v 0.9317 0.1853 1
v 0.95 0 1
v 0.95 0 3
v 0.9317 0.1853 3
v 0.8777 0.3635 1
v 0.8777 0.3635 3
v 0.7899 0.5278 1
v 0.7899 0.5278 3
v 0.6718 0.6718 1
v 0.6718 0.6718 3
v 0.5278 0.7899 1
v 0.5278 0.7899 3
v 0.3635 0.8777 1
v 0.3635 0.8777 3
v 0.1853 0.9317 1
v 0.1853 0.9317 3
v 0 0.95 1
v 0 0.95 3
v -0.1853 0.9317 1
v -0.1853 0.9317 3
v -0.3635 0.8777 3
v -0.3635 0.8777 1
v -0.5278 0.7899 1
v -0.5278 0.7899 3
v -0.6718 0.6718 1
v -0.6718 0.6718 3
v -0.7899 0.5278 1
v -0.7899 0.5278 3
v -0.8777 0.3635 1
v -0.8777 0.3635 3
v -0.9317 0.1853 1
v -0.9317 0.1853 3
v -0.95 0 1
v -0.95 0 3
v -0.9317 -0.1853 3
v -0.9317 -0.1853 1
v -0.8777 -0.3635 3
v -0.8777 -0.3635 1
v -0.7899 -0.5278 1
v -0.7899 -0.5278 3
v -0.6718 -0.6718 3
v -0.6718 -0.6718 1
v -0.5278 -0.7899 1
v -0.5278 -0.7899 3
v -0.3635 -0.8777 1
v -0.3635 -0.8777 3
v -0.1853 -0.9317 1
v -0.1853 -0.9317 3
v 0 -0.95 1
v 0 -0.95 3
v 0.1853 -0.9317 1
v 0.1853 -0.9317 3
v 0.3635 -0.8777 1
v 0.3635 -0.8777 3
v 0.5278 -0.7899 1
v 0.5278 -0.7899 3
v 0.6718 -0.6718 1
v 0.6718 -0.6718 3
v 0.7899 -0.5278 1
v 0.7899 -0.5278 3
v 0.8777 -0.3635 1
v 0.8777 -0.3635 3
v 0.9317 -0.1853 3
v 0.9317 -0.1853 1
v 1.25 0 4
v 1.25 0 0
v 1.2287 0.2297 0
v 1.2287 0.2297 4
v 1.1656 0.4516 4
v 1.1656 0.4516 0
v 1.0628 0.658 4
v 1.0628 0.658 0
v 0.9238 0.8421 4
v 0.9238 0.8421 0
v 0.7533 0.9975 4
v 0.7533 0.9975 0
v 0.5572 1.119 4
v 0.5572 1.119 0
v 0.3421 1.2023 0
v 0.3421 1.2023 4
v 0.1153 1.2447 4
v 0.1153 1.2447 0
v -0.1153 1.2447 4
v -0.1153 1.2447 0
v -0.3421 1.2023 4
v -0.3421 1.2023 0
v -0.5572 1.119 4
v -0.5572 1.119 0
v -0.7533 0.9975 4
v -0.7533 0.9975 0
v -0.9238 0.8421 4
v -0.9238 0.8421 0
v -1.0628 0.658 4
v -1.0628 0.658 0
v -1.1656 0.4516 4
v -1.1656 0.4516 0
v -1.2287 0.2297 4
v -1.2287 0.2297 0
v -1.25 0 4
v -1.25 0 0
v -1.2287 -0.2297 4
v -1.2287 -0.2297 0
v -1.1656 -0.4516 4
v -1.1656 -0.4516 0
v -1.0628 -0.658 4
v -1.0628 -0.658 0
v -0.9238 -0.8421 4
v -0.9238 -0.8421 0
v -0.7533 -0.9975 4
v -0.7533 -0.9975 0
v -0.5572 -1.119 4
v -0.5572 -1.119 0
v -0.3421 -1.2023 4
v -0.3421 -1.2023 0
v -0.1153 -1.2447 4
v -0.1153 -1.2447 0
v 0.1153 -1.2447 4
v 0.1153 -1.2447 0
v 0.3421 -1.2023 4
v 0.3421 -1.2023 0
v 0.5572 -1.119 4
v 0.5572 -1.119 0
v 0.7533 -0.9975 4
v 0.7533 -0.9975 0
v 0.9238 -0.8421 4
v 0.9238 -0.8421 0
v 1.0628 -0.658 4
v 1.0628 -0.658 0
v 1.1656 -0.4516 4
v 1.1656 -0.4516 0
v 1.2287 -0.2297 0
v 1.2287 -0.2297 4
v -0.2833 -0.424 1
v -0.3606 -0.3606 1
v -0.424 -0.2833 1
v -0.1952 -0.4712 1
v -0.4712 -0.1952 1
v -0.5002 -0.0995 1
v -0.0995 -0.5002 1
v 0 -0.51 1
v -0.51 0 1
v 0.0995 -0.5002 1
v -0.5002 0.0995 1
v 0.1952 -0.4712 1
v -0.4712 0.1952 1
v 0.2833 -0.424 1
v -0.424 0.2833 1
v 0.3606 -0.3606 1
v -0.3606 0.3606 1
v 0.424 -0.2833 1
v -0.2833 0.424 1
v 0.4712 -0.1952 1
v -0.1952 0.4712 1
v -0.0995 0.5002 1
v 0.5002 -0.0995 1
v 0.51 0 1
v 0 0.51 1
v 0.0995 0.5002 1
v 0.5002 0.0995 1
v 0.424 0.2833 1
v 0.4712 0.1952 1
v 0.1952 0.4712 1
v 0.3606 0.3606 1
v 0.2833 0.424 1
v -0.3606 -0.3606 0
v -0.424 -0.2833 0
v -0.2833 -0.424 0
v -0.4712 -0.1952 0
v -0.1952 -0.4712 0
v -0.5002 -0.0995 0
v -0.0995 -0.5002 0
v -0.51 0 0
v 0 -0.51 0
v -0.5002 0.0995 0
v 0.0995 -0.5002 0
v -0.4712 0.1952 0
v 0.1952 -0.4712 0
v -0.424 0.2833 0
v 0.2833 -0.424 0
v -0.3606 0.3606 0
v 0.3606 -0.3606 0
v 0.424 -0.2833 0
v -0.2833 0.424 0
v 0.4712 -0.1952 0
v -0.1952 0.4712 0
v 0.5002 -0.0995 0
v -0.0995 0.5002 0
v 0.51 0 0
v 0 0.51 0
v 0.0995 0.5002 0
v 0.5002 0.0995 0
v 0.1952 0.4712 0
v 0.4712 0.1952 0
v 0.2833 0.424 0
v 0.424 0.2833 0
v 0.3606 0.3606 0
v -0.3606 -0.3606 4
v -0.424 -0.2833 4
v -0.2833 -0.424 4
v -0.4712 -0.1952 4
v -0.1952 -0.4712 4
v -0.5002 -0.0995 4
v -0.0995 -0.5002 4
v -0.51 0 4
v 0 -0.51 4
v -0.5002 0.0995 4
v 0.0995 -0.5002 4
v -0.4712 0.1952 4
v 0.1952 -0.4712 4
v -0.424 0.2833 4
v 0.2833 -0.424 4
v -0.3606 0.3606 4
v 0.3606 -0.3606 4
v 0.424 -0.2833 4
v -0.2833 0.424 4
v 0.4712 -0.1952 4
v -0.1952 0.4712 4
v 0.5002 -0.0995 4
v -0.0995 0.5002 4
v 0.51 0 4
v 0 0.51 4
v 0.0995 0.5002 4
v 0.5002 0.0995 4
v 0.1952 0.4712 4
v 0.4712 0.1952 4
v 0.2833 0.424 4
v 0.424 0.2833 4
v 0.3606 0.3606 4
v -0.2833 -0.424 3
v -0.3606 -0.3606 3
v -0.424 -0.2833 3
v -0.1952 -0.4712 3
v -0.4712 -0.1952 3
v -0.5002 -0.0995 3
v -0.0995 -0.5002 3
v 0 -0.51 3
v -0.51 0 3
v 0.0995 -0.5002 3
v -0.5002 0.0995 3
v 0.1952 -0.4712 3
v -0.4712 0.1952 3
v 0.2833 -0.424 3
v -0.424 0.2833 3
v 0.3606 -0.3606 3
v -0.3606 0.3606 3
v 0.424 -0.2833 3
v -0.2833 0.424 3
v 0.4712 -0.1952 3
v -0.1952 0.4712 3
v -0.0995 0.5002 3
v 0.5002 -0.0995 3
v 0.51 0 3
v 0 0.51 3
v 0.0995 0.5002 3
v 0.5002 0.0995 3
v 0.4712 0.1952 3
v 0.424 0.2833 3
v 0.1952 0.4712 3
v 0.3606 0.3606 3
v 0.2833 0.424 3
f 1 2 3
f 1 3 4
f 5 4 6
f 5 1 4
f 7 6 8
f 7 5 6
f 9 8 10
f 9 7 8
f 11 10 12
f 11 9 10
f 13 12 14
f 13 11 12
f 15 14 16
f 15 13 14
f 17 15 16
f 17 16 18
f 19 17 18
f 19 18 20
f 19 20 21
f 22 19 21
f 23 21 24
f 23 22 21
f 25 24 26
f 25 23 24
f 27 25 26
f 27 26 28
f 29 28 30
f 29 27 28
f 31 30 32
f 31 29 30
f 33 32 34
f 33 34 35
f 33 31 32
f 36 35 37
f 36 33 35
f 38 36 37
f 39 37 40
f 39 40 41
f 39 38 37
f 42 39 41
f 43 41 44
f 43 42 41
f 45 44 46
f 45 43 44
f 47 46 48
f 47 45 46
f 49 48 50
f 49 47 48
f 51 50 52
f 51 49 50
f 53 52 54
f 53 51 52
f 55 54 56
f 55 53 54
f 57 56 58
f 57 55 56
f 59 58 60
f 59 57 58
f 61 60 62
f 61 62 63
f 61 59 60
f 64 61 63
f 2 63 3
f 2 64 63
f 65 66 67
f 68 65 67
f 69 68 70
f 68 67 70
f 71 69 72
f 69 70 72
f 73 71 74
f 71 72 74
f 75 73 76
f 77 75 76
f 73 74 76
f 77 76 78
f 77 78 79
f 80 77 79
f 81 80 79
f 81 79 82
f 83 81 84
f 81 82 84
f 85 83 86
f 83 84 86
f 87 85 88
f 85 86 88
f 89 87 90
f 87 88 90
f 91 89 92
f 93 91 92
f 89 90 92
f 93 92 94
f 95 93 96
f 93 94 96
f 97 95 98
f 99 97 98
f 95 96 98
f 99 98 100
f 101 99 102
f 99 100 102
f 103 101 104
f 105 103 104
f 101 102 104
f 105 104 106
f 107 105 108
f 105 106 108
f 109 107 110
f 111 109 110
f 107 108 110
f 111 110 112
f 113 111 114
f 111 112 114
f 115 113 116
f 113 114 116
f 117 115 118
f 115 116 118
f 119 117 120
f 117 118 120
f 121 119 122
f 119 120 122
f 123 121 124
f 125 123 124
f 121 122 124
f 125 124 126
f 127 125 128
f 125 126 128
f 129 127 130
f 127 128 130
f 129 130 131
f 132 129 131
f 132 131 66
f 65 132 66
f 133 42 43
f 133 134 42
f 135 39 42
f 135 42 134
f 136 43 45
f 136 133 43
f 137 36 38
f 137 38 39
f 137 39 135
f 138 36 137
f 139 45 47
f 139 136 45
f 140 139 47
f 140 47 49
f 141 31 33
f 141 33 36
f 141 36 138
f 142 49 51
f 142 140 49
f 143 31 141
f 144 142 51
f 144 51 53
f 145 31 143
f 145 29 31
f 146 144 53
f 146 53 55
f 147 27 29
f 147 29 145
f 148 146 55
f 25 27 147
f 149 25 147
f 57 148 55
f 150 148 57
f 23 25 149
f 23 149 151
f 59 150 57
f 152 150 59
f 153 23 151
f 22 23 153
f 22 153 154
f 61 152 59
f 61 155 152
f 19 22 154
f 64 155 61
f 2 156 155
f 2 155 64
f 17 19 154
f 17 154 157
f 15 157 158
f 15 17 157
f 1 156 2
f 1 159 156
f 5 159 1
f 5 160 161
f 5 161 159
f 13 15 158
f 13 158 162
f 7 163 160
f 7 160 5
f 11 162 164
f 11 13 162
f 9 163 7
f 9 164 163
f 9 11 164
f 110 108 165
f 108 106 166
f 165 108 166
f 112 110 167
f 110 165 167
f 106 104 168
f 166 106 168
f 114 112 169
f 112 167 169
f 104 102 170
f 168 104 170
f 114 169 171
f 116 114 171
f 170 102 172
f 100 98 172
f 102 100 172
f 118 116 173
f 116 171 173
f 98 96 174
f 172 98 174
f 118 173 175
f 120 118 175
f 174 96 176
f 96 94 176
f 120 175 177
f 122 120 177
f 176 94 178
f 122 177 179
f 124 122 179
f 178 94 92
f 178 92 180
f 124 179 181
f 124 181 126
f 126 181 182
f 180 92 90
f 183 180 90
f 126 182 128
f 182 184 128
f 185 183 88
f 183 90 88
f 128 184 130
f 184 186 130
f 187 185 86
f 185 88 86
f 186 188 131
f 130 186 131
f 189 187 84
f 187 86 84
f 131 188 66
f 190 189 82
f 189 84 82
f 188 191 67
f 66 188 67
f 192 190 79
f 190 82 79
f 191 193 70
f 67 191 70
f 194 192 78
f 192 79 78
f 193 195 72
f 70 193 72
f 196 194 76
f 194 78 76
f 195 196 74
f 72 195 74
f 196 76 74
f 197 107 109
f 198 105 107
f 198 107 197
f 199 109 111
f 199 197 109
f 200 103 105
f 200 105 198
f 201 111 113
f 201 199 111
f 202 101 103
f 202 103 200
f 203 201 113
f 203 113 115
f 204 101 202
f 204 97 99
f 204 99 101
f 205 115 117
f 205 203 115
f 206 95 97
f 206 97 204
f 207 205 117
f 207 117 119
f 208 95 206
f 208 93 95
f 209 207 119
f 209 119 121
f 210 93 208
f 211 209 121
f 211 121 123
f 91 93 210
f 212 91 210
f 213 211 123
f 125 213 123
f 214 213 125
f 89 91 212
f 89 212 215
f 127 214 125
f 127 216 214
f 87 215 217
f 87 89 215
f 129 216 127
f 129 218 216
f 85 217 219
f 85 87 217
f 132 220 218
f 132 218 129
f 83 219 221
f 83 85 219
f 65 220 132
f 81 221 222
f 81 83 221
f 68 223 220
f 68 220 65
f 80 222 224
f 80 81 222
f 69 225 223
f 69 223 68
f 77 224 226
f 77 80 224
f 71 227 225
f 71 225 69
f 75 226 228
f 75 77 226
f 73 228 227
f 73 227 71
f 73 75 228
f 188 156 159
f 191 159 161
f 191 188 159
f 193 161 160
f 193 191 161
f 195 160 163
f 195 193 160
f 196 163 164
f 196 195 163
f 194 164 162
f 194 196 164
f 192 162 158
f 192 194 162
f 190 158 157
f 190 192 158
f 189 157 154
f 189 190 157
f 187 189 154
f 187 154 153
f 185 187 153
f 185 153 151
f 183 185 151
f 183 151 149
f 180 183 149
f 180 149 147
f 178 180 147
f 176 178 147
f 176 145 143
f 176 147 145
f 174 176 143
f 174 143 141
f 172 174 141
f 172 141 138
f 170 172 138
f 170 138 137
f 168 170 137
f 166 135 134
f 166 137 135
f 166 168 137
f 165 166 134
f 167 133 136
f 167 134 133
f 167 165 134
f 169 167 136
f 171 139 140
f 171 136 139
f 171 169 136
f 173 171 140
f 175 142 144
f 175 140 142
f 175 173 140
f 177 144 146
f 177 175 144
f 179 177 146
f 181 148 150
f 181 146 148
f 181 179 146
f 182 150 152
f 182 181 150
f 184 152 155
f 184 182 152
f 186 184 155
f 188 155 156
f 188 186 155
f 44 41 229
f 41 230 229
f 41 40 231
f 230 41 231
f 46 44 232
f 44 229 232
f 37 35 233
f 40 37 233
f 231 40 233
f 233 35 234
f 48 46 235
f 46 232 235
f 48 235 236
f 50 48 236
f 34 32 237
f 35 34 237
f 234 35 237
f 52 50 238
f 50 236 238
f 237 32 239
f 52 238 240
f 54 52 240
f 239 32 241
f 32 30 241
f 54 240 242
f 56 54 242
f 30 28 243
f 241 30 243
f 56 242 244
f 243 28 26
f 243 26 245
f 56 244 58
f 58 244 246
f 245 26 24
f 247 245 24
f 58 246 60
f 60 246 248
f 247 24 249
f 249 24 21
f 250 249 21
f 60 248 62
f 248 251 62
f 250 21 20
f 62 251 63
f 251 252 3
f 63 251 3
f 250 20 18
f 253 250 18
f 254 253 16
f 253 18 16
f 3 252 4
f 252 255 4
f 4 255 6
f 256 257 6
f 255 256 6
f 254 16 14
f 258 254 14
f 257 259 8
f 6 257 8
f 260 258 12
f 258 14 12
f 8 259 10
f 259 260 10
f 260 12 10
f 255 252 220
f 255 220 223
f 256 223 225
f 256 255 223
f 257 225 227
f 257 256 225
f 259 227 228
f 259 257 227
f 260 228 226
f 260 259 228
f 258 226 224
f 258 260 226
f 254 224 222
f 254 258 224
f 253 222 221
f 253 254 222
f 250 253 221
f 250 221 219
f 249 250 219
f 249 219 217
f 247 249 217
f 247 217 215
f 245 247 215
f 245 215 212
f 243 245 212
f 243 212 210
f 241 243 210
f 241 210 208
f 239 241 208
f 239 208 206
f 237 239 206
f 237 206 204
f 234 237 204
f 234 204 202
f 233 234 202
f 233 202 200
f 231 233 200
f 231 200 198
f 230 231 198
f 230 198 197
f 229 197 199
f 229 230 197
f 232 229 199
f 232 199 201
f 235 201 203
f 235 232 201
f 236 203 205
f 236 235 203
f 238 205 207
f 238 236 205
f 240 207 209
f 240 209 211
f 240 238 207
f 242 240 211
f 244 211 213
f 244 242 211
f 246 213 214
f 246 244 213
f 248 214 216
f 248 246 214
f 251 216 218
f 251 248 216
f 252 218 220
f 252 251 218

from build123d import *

# Parameters (mm, degrees)
CYLINDER_R     = 0.95
CYLINDER_DEPTH = 2
TUBE005_R      = 1.25
TUBE005_R_2    = 0.51
TUBE005_DEPTH  = 4


with BuildPart() as cylinder:
    # Cylinder → Cylinder (new body)
    with BuildSketch(Plane.XY.offset(1)):
        Circle(CYLINDER_R)
    extrude(amount=CYLINDER_DEPTH)


with BuildPart() as cut:
    # Tube005 → Tube005 (new body)
    with BuildSketch(Plane.XY):
        Circle(TUBE005_R)
        Circle(TUBE005_R_2, mode=Mode.SUBTRACT)
    extrude(amount=TUBE005_DEPTH)

    # Cut: cut Cylinder
    add(cylinder.part, mode=Mode.SUBTRACT)


solid = cut.part
